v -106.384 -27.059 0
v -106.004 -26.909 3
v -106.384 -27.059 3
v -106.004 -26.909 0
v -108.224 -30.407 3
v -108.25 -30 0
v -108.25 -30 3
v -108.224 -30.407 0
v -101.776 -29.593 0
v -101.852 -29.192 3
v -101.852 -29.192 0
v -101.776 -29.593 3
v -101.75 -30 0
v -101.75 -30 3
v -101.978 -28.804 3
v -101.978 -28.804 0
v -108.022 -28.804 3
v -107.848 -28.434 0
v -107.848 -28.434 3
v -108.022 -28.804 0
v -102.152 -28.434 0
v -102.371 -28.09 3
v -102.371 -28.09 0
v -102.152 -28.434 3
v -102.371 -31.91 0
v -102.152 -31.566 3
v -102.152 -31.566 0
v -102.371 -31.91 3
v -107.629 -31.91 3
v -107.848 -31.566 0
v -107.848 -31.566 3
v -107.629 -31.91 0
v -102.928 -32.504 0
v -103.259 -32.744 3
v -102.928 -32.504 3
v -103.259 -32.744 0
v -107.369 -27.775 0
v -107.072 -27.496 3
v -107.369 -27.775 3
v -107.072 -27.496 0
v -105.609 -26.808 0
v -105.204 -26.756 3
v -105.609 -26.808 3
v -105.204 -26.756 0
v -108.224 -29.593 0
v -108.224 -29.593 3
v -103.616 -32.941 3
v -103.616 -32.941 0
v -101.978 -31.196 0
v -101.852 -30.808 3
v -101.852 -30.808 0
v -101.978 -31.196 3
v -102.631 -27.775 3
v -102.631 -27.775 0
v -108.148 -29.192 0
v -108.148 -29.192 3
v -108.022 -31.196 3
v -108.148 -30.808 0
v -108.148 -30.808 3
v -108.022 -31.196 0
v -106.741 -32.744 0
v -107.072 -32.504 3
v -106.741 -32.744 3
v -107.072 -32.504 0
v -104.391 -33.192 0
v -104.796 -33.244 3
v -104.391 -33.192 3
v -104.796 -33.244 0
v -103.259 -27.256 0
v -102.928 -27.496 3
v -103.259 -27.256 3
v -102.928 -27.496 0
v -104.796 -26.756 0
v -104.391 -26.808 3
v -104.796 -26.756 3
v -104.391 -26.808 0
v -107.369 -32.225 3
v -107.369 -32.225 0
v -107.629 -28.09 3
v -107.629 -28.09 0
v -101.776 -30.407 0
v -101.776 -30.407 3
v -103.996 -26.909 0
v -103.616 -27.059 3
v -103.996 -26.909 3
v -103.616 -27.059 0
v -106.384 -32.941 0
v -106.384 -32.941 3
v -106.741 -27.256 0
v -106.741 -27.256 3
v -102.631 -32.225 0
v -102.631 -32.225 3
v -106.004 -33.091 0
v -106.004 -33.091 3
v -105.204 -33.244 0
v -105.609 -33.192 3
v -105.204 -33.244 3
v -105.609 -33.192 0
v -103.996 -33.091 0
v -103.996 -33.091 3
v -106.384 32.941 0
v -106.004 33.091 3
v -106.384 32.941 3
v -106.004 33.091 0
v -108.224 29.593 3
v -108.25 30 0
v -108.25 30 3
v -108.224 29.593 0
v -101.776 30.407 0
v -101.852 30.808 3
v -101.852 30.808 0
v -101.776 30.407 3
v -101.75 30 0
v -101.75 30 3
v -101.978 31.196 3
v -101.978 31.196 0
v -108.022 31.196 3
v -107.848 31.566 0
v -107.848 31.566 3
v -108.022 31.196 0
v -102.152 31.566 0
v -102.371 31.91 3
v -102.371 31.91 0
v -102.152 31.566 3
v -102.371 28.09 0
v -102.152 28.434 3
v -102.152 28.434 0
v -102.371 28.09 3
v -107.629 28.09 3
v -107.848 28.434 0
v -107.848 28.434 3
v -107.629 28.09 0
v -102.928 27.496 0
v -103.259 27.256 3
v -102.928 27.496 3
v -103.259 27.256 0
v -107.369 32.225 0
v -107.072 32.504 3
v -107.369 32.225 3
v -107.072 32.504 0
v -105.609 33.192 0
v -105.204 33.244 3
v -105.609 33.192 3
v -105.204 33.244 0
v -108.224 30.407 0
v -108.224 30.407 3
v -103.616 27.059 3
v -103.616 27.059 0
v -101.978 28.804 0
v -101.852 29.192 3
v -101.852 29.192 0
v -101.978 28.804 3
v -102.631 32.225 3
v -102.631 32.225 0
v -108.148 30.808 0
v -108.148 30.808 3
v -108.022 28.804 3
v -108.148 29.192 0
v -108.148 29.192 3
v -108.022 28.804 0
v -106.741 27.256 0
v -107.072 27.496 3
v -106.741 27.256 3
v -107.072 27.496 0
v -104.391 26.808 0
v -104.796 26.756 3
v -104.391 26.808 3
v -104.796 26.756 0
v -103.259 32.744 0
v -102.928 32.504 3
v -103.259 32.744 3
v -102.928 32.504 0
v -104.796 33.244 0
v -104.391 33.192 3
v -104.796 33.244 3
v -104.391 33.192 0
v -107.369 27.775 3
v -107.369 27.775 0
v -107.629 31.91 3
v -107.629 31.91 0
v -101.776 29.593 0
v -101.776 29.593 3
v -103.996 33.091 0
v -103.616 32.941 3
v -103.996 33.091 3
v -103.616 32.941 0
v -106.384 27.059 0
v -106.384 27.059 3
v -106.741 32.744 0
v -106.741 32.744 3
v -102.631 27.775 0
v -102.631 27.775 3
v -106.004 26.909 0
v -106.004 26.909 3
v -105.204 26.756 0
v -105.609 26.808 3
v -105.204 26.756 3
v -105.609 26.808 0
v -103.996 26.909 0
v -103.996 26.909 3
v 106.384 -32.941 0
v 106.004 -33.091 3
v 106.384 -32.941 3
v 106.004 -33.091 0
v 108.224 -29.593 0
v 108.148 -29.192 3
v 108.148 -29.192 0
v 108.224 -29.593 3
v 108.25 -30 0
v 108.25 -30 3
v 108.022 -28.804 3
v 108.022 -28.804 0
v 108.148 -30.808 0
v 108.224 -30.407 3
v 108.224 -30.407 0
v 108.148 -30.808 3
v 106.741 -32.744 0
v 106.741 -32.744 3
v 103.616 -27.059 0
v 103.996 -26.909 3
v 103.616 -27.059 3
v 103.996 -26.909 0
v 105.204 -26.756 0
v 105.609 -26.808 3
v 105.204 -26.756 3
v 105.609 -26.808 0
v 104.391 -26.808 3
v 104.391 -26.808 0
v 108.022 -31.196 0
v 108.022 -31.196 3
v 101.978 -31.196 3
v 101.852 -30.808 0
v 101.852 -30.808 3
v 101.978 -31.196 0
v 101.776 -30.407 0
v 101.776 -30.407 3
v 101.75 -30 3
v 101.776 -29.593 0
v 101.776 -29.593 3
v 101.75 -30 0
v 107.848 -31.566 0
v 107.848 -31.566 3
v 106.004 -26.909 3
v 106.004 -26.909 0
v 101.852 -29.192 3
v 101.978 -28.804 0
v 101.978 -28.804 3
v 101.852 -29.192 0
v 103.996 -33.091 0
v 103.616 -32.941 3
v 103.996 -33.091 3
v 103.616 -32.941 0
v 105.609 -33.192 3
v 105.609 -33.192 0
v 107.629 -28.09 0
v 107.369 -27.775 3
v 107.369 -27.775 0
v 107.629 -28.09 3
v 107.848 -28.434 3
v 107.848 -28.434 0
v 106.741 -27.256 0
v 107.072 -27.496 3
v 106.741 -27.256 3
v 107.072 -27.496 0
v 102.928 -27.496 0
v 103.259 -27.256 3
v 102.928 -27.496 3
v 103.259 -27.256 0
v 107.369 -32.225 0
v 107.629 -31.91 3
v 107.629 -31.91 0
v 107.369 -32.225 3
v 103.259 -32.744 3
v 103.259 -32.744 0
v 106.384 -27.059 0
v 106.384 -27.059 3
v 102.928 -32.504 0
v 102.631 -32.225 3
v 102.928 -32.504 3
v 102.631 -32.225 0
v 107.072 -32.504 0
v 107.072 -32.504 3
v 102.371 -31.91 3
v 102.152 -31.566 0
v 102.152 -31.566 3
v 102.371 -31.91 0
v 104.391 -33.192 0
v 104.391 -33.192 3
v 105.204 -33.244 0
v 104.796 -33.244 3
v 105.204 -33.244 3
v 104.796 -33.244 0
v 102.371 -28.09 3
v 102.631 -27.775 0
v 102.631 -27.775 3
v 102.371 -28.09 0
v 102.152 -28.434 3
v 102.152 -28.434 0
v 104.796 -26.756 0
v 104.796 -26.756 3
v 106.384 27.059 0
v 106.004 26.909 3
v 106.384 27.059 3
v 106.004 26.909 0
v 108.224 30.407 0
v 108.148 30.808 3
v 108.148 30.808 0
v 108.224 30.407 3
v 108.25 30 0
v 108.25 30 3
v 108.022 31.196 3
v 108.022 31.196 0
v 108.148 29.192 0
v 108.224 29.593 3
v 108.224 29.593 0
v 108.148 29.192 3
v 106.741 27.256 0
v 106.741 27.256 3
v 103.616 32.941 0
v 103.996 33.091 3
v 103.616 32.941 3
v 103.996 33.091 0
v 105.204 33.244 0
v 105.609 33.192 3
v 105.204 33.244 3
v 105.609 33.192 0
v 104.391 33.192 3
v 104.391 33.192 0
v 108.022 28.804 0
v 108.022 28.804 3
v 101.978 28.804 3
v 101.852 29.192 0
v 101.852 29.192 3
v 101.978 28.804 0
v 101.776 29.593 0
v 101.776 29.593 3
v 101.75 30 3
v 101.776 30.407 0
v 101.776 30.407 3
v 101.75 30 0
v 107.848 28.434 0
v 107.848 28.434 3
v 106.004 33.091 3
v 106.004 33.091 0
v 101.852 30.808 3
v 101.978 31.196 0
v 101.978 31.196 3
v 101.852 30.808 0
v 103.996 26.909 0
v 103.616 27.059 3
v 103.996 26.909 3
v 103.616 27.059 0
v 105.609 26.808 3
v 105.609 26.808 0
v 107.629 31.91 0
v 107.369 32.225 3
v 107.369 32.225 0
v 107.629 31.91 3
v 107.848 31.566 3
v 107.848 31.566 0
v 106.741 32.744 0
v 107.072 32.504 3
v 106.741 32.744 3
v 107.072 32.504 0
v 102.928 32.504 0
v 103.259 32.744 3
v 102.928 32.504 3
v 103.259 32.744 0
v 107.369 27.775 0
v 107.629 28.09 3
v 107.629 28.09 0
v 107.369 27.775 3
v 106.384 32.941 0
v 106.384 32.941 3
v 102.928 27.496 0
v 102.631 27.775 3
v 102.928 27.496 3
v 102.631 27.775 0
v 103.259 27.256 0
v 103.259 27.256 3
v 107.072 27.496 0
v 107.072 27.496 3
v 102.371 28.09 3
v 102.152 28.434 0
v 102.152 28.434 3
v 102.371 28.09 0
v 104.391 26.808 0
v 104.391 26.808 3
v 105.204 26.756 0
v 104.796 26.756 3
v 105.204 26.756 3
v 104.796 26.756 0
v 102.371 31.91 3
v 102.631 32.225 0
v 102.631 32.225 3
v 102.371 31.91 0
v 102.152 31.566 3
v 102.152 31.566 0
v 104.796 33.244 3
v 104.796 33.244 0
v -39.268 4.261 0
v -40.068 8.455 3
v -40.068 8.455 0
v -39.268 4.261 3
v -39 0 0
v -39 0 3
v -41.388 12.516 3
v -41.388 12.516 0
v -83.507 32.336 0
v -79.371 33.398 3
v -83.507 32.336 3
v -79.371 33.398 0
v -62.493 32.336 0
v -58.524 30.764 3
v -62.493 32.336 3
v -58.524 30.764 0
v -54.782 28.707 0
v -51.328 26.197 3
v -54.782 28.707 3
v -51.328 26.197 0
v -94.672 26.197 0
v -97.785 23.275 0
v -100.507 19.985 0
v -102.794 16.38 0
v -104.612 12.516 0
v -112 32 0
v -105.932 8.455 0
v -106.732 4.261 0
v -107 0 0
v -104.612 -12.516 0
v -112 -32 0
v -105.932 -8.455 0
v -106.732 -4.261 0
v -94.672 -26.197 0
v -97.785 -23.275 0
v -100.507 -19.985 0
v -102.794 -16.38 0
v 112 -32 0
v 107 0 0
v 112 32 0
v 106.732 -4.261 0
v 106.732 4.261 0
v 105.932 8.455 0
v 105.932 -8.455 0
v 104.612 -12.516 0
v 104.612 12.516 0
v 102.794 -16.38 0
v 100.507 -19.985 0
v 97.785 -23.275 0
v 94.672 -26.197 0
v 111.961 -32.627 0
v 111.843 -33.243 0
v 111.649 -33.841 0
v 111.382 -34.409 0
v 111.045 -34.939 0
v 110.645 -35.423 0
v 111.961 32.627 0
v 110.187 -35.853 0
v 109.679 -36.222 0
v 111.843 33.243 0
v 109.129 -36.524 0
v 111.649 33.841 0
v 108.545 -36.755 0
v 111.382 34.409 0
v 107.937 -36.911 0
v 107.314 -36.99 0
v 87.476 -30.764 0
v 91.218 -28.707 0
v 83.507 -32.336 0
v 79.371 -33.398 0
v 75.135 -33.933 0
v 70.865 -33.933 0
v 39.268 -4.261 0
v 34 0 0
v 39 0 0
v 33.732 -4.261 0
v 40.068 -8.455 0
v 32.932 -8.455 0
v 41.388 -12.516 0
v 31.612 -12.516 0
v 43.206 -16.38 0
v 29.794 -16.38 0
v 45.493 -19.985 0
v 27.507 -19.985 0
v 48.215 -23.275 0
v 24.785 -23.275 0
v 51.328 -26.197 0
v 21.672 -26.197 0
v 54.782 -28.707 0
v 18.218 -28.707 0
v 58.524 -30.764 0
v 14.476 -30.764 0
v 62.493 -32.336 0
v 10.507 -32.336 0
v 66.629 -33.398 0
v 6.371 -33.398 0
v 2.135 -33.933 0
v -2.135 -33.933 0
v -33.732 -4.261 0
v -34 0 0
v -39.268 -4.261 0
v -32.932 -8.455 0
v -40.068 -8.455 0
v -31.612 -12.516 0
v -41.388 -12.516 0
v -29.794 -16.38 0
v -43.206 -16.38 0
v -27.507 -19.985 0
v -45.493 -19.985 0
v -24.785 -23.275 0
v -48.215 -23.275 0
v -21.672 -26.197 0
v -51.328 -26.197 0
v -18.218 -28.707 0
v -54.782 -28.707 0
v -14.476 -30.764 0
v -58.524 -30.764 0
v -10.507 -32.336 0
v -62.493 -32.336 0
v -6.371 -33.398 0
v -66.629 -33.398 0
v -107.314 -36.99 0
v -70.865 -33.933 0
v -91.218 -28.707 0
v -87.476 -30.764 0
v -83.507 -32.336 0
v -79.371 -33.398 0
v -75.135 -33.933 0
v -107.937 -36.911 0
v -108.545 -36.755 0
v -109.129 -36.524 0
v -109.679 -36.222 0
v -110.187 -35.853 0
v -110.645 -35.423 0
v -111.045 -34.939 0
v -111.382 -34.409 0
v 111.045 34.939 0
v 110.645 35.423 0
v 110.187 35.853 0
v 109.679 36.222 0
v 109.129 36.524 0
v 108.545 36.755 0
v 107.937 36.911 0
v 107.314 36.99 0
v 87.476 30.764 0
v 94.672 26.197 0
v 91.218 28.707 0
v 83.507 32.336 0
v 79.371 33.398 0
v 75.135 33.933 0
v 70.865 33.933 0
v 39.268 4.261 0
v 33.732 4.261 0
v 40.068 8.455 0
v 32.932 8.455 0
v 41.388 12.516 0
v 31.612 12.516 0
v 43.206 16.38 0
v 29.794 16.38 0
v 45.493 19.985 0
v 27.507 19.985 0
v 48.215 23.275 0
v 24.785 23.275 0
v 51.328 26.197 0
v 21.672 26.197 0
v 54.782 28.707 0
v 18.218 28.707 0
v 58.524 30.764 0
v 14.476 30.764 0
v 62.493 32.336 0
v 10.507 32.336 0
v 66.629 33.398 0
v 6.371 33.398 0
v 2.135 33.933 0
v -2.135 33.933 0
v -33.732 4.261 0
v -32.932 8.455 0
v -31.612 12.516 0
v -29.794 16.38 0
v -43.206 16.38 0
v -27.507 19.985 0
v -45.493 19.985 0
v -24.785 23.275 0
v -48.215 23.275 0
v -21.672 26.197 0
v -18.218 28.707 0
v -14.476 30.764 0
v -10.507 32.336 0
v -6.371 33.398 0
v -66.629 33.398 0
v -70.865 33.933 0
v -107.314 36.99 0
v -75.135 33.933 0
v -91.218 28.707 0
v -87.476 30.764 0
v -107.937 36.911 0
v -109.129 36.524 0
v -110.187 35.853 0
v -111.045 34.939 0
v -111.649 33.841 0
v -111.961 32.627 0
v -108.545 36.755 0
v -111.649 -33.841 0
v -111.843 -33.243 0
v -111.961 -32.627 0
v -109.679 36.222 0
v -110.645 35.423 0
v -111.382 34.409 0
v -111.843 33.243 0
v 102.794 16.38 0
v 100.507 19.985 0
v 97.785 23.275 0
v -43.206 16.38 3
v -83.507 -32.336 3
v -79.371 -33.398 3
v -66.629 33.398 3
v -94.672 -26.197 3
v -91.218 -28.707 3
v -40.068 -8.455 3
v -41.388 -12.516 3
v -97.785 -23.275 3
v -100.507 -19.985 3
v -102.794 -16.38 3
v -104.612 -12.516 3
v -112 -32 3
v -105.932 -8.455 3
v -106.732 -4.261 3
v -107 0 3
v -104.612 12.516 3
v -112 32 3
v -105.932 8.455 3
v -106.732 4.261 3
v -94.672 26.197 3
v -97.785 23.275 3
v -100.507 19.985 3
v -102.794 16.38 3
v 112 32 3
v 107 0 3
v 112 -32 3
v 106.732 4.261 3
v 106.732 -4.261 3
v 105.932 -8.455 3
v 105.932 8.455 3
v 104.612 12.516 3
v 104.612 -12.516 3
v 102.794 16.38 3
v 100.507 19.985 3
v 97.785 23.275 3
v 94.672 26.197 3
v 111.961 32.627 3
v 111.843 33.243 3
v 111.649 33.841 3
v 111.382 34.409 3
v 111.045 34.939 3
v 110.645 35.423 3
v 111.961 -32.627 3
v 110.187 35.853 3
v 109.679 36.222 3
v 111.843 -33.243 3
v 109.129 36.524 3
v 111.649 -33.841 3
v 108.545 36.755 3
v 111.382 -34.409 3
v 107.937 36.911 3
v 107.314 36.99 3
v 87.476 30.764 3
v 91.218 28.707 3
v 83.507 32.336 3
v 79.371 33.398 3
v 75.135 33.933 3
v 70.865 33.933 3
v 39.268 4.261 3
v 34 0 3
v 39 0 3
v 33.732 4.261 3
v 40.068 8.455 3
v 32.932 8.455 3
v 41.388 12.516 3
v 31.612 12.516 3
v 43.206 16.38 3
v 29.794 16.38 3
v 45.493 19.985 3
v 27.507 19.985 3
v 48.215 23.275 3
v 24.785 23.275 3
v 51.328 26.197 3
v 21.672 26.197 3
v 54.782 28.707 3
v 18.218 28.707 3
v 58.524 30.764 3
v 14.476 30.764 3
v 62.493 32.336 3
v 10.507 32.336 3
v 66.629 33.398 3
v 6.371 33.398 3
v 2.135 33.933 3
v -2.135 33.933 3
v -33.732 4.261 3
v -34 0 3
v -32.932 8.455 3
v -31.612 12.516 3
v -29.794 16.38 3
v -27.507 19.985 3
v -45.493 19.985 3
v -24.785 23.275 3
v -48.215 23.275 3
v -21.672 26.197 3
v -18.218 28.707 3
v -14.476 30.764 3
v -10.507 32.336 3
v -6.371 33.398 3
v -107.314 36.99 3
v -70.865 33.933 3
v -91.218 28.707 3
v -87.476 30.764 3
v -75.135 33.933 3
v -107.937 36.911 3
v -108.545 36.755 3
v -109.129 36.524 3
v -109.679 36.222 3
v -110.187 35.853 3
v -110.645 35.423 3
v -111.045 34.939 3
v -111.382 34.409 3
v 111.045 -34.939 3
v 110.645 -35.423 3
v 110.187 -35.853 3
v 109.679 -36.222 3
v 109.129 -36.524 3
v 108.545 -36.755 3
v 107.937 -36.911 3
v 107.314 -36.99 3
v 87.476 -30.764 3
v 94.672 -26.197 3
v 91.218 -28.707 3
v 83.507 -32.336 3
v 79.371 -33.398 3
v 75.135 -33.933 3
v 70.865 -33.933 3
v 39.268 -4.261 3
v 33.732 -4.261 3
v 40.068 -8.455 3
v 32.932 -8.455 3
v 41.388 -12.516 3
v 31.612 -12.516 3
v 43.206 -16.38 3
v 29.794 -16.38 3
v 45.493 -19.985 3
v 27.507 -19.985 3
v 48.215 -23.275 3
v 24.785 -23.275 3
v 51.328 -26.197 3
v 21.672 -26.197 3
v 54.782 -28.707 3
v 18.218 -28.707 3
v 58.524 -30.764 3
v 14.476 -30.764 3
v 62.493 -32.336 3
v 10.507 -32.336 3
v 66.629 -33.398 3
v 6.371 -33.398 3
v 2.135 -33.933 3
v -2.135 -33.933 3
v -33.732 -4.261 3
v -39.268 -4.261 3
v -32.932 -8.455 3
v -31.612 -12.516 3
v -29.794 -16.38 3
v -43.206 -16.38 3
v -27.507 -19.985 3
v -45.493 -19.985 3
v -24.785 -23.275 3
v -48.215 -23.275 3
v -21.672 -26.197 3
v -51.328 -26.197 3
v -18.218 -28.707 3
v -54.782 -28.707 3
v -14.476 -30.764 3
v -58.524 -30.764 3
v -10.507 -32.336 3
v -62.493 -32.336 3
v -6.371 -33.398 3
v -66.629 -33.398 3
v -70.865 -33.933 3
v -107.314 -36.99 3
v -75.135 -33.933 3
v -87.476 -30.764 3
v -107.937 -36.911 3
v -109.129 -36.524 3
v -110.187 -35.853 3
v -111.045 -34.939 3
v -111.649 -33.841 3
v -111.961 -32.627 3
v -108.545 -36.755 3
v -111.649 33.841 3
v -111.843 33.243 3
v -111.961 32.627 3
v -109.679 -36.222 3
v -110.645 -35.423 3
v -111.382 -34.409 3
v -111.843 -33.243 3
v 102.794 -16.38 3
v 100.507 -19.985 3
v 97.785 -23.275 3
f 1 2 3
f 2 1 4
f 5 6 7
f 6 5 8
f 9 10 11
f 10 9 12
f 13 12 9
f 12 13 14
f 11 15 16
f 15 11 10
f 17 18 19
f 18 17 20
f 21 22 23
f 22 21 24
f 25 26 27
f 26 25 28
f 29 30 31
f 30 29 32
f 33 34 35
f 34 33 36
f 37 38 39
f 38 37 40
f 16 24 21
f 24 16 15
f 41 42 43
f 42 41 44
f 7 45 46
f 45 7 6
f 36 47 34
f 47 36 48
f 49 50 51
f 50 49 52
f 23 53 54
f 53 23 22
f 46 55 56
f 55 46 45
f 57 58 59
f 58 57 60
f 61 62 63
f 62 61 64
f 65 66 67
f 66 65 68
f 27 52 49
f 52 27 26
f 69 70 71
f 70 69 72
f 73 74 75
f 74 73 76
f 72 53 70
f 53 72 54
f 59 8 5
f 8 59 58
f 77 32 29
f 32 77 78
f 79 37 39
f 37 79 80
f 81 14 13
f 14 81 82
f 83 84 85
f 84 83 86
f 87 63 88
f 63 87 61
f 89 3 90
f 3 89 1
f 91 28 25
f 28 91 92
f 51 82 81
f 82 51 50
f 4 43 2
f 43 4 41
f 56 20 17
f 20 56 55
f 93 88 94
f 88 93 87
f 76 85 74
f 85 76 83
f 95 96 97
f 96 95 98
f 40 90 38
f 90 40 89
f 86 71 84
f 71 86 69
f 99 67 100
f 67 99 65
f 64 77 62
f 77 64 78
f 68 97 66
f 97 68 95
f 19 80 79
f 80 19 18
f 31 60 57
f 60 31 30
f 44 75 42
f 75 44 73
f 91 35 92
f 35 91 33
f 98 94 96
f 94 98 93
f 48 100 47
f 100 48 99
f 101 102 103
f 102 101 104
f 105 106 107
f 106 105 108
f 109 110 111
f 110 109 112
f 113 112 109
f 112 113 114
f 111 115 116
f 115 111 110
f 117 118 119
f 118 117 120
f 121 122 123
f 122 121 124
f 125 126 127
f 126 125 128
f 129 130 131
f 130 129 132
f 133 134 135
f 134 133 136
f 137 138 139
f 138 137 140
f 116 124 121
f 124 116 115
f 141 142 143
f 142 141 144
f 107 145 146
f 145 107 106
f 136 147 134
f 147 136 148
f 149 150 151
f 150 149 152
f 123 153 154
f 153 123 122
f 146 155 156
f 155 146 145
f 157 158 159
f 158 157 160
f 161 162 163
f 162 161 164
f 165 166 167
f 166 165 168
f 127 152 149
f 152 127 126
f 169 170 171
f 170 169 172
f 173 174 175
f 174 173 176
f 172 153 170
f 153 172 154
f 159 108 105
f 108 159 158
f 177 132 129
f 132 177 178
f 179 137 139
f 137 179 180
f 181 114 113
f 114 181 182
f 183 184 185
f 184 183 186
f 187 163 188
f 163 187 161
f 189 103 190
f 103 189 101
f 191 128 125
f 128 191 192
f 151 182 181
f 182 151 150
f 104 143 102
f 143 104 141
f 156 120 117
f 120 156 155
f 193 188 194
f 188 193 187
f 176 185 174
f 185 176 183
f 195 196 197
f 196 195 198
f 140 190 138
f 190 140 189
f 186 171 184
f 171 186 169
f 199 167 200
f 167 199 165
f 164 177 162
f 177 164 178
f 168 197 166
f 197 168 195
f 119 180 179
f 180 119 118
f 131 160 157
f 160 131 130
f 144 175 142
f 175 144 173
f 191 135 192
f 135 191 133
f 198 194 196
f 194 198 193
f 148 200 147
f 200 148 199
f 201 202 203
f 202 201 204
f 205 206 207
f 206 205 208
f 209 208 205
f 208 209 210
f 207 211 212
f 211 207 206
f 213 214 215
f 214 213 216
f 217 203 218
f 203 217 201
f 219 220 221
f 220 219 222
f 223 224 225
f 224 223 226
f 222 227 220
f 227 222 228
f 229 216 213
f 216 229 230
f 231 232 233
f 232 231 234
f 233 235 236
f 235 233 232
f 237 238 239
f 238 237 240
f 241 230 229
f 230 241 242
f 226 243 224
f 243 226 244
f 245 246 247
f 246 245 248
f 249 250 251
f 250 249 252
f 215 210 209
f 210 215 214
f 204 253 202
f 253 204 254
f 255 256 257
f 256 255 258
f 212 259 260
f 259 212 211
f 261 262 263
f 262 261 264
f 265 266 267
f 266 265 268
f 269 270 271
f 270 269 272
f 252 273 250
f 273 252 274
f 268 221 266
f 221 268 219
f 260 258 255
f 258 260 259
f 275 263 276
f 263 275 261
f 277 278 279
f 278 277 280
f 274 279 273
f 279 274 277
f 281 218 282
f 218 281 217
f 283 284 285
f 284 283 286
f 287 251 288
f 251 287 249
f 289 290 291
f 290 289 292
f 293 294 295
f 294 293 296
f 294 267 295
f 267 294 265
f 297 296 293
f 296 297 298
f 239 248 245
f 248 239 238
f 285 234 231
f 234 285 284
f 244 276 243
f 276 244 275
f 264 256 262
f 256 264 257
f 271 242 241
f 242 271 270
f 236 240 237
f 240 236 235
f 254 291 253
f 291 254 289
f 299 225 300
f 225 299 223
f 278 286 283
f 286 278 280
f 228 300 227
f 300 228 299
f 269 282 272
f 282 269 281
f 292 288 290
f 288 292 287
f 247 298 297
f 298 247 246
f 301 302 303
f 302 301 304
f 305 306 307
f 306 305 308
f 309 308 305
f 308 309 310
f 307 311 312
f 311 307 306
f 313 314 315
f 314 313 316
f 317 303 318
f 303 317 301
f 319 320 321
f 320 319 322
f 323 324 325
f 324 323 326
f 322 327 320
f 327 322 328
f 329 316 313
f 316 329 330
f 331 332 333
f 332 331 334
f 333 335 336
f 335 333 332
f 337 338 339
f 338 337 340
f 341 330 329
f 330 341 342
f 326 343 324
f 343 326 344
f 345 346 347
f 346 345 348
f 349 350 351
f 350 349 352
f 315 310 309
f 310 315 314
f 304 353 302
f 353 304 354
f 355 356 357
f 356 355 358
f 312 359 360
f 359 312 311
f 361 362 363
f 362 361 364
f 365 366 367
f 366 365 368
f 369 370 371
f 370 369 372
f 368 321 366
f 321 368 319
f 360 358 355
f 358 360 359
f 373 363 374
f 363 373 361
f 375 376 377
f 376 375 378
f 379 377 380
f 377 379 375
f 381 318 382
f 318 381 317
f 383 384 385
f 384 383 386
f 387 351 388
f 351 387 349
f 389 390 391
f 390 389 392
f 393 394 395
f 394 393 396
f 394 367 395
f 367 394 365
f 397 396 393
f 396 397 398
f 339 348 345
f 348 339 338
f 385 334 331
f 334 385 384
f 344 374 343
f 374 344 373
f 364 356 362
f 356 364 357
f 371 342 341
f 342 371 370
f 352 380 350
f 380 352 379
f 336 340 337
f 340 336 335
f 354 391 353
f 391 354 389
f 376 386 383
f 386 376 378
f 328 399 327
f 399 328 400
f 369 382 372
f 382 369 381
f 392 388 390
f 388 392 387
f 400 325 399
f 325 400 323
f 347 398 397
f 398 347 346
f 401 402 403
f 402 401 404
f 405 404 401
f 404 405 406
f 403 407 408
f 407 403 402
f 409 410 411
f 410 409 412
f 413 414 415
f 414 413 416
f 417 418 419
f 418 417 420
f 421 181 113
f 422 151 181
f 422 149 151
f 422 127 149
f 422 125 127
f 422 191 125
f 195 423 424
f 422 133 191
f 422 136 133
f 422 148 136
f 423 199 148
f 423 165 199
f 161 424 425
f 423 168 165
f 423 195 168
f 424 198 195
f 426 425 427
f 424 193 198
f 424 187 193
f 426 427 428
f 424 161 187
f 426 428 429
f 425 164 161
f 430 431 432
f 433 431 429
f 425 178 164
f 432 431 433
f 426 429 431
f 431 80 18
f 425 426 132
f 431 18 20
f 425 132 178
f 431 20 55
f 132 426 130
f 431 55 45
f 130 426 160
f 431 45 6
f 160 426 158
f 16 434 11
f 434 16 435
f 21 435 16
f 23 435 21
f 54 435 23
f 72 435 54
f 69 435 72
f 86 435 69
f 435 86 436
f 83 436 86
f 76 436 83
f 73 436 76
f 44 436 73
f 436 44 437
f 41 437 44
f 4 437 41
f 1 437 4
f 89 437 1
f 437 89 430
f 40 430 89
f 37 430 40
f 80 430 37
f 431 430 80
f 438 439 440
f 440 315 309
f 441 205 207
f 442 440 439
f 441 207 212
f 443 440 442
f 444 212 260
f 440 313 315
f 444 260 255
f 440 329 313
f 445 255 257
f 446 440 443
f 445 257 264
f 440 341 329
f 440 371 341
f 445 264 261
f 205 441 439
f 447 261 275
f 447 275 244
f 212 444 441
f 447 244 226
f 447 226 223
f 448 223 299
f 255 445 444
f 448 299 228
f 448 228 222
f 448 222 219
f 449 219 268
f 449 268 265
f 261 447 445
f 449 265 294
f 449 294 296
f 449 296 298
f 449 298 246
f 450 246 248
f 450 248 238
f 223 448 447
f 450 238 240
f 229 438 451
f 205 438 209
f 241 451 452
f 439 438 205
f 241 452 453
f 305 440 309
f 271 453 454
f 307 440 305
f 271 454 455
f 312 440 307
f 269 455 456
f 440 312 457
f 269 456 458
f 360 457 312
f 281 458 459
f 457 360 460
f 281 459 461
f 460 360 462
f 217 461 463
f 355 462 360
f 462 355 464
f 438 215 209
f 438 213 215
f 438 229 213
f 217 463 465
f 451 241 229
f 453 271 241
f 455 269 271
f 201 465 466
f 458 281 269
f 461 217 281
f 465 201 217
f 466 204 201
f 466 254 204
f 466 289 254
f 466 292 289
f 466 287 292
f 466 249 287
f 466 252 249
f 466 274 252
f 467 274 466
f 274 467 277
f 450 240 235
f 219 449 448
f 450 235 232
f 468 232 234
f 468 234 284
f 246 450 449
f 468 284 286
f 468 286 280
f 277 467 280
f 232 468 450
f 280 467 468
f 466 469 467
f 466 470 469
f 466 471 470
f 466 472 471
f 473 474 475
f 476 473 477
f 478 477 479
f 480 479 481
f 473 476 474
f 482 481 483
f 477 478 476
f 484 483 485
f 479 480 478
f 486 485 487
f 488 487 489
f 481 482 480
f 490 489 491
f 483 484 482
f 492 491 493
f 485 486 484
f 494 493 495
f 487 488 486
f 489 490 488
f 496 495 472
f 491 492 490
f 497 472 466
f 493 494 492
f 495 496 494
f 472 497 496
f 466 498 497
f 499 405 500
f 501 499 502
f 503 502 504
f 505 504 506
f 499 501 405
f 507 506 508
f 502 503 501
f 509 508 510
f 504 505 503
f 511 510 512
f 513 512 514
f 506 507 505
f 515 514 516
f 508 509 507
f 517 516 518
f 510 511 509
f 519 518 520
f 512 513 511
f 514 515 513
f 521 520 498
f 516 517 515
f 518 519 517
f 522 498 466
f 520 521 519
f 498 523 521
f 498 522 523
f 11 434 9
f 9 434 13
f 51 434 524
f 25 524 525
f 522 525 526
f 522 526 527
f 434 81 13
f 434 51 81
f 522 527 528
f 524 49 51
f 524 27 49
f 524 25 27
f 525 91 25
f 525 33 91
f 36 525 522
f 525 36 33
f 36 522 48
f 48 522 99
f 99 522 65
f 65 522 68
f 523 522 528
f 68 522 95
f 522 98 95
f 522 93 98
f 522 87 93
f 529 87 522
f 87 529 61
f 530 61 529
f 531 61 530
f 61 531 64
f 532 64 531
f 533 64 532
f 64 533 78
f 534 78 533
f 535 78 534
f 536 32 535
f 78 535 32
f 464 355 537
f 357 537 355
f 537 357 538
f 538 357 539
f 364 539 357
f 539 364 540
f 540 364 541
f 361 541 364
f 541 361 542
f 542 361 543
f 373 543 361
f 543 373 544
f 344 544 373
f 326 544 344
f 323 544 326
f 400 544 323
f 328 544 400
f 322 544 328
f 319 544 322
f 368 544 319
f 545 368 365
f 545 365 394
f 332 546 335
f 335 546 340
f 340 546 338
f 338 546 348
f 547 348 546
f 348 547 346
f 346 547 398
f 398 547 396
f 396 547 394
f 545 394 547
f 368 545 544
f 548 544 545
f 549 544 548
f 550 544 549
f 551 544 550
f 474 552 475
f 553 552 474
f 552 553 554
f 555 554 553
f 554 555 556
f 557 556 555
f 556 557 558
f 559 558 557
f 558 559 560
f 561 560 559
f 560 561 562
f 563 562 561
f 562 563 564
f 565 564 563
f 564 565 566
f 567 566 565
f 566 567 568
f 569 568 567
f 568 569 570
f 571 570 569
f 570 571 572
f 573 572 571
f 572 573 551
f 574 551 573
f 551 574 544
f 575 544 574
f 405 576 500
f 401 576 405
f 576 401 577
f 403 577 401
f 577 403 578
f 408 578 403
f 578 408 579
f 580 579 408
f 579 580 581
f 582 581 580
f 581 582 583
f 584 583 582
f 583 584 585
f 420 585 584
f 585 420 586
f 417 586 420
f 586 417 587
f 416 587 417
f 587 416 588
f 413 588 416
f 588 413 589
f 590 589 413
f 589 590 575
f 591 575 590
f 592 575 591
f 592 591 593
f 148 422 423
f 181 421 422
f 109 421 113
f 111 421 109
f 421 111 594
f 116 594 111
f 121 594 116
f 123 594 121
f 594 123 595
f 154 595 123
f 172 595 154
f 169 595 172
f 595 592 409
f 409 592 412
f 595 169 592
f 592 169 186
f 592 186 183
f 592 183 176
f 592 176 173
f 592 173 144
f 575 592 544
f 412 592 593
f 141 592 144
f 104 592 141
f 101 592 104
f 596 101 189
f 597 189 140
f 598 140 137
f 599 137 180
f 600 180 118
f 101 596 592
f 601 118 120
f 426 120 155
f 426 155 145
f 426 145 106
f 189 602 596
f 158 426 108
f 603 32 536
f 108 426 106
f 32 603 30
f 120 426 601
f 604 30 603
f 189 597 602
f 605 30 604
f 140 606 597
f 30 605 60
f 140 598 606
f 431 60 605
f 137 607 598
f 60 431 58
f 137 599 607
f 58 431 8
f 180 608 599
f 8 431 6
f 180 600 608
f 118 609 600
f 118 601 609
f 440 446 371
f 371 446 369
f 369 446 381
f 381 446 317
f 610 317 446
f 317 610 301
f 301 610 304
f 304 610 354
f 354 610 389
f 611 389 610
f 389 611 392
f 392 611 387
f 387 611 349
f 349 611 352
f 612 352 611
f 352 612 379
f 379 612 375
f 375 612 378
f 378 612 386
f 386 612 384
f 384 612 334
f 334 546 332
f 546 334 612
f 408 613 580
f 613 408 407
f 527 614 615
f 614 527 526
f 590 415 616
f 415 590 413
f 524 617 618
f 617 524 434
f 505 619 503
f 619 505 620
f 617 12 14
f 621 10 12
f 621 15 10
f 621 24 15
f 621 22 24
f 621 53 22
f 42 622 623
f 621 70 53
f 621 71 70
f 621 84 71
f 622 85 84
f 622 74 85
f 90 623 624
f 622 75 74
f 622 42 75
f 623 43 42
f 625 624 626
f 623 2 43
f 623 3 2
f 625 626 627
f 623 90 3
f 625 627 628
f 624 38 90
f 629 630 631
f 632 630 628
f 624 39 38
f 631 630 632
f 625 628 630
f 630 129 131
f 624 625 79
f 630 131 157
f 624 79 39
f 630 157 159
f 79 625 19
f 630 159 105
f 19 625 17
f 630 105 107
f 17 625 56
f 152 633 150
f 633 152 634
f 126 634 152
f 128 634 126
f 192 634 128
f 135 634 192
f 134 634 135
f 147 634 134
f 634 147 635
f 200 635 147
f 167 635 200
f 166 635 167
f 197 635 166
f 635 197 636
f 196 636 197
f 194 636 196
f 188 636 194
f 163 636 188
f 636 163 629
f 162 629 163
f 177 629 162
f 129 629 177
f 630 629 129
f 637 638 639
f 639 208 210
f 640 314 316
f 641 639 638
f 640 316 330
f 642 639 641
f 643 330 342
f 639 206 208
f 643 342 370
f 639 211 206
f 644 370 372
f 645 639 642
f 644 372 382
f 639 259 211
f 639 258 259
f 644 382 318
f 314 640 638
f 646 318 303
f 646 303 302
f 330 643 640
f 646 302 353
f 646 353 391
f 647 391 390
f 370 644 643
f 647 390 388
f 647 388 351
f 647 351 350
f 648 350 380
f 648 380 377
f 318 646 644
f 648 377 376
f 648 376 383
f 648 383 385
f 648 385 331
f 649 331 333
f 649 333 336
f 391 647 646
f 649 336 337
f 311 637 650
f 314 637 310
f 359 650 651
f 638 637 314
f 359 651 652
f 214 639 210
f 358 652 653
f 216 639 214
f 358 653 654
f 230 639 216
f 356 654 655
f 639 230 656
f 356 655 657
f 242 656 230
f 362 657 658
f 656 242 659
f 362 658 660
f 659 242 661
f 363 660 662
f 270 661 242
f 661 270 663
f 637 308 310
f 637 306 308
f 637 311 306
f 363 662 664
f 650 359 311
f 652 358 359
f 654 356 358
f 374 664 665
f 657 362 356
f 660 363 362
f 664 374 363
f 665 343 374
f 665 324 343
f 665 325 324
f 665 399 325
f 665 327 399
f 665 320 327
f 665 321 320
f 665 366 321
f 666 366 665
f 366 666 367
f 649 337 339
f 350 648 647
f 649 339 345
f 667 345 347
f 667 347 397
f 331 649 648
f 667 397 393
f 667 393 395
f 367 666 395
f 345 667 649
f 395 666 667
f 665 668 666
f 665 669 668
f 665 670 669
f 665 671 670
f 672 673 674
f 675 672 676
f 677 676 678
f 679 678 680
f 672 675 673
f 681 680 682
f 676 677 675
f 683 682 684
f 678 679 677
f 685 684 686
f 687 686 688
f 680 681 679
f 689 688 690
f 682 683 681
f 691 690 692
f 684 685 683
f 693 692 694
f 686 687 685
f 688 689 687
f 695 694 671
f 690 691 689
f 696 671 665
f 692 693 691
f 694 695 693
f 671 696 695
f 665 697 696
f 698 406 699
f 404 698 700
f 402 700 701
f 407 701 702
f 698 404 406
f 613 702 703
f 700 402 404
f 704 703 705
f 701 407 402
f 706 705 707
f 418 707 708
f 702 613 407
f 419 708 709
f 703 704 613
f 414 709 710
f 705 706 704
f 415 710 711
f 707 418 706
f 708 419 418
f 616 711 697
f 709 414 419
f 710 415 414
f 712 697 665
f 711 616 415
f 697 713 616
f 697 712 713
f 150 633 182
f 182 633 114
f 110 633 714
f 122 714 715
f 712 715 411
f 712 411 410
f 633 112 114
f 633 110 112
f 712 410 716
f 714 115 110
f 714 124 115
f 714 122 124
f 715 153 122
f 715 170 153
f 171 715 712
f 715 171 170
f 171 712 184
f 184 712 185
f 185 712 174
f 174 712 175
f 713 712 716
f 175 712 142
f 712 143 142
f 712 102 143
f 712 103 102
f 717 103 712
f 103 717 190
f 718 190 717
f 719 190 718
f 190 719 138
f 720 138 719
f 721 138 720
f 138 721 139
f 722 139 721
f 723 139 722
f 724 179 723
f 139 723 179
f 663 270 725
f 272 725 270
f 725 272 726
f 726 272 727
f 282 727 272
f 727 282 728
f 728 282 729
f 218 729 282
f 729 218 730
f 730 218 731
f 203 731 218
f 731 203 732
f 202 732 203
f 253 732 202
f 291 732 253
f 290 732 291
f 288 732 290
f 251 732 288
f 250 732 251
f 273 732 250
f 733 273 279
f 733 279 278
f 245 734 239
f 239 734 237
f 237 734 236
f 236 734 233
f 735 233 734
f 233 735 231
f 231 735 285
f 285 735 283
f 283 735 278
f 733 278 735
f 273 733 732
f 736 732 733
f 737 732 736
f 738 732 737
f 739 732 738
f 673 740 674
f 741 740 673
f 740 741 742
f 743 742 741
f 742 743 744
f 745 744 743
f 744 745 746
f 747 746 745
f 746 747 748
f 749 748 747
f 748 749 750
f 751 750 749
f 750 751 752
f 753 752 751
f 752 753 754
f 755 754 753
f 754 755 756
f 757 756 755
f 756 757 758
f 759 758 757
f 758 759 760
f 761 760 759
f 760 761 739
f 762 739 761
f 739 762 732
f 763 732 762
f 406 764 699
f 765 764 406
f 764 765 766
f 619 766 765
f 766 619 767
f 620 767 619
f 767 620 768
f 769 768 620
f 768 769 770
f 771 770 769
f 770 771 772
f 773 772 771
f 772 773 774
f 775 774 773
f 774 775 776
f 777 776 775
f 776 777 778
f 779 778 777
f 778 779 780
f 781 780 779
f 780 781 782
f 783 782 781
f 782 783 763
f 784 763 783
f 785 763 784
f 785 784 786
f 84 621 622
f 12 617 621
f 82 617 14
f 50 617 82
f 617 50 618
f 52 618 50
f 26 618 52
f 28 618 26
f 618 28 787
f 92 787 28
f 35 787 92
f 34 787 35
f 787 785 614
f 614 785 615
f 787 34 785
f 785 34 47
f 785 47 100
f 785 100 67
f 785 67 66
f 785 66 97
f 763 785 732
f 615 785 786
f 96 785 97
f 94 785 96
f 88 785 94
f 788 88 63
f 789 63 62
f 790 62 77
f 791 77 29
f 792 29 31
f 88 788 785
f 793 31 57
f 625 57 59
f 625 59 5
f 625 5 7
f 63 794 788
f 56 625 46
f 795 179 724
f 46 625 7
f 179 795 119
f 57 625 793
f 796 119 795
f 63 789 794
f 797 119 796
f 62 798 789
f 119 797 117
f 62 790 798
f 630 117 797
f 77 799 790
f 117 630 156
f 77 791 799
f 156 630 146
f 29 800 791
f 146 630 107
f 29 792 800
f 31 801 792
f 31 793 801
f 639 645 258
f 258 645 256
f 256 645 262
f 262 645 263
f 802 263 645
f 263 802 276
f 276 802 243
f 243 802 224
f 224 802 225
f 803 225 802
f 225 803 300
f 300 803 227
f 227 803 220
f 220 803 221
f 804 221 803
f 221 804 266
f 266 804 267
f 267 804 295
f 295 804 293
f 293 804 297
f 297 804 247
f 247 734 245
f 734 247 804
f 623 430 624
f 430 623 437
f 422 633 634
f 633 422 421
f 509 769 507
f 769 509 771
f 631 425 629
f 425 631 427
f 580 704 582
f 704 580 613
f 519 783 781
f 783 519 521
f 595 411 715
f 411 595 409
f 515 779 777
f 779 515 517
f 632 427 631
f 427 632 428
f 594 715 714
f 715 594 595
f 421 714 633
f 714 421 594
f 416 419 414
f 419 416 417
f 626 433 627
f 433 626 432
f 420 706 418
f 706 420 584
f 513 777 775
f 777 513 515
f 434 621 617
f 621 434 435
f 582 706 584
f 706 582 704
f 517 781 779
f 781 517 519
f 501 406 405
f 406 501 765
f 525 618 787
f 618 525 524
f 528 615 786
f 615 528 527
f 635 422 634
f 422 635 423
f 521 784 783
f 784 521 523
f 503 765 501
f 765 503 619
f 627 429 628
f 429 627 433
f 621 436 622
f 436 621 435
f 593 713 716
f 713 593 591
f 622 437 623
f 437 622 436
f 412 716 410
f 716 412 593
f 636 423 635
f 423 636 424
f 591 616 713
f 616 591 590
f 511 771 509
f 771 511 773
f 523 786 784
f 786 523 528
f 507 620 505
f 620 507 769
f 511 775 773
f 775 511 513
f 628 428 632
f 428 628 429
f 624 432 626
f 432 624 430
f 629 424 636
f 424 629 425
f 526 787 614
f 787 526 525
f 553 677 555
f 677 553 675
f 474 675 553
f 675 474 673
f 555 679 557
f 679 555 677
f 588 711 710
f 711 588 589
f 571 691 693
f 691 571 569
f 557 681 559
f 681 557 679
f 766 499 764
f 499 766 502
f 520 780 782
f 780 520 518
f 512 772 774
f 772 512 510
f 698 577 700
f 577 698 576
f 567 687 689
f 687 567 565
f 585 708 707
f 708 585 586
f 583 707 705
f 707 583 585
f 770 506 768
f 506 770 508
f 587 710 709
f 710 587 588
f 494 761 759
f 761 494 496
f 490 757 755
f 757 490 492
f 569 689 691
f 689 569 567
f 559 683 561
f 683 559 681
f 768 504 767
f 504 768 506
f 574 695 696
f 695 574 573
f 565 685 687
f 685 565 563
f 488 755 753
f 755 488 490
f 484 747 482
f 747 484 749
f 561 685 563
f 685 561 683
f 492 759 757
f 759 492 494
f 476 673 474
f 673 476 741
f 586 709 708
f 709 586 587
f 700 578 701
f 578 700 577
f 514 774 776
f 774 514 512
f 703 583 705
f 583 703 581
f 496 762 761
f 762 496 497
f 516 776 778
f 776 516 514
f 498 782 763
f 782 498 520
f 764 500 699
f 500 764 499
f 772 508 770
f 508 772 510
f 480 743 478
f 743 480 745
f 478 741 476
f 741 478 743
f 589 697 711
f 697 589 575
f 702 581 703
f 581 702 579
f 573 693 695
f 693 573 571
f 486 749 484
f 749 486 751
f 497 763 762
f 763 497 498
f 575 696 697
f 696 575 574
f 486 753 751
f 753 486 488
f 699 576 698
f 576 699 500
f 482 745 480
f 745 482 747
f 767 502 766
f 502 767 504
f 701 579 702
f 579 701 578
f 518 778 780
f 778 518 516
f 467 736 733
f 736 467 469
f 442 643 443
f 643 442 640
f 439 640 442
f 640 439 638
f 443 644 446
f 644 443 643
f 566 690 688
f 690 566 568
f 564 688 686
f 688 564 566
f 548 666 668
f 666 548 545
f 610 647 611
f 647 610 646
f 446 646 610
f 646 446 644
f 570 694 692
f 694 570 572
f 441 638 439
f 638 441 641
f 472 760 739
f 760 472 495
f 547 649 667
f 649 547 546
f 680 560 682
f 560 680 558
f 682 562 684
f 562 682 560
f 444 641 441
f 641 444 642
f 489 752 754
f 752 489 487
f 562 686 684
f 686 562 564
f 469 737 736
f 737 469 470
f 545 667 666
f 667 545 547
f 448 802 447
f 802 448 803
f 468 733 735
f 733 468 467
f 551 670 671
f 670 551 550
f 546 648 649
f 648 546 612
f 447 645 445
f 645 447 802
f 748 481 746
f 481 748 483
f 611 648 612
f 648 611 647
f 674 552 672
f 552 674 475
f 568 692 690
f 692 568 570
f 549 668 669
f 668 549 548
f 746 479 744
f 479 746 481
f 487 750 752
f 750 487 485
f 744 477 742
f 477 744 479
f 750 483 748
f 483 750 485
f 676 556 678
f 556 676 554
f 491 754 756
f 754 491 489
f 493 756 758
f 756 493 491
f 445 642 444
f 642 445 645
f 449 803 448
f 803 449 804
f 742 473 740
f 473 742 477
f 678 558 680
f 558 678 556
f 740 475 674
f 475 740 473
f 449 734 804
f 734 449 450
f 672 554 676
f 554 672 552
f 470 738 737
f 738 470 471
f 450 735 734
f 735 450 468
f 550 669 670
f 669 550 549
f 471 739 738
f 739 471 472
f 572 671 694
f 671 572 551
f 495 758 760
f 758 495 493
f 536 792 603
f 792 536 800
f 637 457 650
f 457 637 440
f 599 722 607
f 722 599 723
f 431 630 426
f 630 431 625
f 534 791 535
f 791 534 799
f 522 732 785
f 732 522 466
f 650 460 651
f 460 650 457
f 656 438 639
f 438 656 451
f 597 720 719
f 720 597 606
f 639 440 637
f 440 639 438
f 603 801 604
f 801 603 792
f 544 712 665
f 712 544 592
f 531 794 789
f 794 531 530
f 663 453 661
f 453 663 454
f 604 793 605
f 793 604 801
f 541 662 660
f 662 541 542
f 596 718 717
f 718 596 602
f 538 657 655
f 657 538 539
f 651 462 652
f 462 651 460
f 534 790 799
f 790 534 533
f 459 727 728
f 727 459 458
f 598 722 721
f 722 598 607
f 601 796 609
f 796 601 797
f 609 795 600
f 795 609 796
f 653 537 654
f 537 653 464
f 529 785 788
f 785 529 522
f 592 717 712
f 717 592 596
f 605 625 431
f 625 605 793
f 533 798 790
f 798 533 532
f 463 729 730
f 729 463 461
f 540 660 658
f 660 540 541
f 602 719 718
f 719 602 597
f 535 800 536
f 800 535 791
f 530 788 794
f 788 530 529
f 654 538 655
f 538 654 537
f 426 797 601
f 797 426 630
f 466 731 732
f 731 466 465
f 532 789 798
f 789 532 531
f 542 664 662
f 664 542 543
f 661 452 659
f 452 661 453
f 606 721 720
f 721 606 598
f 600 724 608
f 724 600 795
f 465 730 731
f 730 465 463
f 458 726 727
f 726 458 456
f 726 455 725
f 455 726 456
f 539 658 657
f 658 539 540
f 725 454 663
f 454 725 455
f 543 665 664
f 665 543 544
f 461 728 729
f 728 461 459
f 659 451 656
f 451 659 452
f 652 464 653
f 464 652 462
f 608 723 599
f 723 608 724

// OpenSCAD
$fn = 50;

difference() {
	union() {
		hull() {
			translate(v = [-107.0, 32.0, 0]) {
				cylinder(h = 3, r = 5);
			}
			translate(v = [107.0, 32.0, 0]) {
				cylinder(h = 3, r = 5);
			}
			translate(v = [-107.0, -32.0, 0]) {
				cylinder(h = 3, r = 5);
			}
			translate(v = [107.0, -32.0, 0]) {
				cylinder(h = 3, r = 5);
			}
		}
	}
	union() {
		translate(v = [-105.0, -30.0, -100.0]) {
			cylinder(h = 200, r = 3.25);
		}
		translate(v = [-105.0, 30.0, -100.0]) {
			cylinder(h = 200, r = 3.25);
		}
		translate(v = [105.0, -30.0, -100.0]) {
			cylinder(h = 200, r = 3.25);
		}
		translate(v = [105.0, 30.0, -100.0]) {
			cylinder(h = 200, r = 3.25);
		}
		translate(v = [-105.0, -30.0, -100.0]) {
			cylinder(h = 200, r = 1.8);
		}
		translate(v = [-105.0, 30.0, -100.0]) {
			cylinder(h = 200, r = 1.8);
		}
		translate(v = [105.0, -30.0, -100.0]) {
			cylinder(h = 200, r = 1.8);
		}
		translate(v = [105.0, 30.0, -100.0]) {
			cylinder(h = 200, r = 1.8);
		}
		translate(v = [-73.0, 0, 0.0]) {
			cylinder(h = 3, r = 34.0);
		}
		cylinder(h = 3, r = 34.0);
		translate(v = [73.0, 0, 0.0]) {
			cylinder(h = 3, r = 34.0);
		}
	}
}
